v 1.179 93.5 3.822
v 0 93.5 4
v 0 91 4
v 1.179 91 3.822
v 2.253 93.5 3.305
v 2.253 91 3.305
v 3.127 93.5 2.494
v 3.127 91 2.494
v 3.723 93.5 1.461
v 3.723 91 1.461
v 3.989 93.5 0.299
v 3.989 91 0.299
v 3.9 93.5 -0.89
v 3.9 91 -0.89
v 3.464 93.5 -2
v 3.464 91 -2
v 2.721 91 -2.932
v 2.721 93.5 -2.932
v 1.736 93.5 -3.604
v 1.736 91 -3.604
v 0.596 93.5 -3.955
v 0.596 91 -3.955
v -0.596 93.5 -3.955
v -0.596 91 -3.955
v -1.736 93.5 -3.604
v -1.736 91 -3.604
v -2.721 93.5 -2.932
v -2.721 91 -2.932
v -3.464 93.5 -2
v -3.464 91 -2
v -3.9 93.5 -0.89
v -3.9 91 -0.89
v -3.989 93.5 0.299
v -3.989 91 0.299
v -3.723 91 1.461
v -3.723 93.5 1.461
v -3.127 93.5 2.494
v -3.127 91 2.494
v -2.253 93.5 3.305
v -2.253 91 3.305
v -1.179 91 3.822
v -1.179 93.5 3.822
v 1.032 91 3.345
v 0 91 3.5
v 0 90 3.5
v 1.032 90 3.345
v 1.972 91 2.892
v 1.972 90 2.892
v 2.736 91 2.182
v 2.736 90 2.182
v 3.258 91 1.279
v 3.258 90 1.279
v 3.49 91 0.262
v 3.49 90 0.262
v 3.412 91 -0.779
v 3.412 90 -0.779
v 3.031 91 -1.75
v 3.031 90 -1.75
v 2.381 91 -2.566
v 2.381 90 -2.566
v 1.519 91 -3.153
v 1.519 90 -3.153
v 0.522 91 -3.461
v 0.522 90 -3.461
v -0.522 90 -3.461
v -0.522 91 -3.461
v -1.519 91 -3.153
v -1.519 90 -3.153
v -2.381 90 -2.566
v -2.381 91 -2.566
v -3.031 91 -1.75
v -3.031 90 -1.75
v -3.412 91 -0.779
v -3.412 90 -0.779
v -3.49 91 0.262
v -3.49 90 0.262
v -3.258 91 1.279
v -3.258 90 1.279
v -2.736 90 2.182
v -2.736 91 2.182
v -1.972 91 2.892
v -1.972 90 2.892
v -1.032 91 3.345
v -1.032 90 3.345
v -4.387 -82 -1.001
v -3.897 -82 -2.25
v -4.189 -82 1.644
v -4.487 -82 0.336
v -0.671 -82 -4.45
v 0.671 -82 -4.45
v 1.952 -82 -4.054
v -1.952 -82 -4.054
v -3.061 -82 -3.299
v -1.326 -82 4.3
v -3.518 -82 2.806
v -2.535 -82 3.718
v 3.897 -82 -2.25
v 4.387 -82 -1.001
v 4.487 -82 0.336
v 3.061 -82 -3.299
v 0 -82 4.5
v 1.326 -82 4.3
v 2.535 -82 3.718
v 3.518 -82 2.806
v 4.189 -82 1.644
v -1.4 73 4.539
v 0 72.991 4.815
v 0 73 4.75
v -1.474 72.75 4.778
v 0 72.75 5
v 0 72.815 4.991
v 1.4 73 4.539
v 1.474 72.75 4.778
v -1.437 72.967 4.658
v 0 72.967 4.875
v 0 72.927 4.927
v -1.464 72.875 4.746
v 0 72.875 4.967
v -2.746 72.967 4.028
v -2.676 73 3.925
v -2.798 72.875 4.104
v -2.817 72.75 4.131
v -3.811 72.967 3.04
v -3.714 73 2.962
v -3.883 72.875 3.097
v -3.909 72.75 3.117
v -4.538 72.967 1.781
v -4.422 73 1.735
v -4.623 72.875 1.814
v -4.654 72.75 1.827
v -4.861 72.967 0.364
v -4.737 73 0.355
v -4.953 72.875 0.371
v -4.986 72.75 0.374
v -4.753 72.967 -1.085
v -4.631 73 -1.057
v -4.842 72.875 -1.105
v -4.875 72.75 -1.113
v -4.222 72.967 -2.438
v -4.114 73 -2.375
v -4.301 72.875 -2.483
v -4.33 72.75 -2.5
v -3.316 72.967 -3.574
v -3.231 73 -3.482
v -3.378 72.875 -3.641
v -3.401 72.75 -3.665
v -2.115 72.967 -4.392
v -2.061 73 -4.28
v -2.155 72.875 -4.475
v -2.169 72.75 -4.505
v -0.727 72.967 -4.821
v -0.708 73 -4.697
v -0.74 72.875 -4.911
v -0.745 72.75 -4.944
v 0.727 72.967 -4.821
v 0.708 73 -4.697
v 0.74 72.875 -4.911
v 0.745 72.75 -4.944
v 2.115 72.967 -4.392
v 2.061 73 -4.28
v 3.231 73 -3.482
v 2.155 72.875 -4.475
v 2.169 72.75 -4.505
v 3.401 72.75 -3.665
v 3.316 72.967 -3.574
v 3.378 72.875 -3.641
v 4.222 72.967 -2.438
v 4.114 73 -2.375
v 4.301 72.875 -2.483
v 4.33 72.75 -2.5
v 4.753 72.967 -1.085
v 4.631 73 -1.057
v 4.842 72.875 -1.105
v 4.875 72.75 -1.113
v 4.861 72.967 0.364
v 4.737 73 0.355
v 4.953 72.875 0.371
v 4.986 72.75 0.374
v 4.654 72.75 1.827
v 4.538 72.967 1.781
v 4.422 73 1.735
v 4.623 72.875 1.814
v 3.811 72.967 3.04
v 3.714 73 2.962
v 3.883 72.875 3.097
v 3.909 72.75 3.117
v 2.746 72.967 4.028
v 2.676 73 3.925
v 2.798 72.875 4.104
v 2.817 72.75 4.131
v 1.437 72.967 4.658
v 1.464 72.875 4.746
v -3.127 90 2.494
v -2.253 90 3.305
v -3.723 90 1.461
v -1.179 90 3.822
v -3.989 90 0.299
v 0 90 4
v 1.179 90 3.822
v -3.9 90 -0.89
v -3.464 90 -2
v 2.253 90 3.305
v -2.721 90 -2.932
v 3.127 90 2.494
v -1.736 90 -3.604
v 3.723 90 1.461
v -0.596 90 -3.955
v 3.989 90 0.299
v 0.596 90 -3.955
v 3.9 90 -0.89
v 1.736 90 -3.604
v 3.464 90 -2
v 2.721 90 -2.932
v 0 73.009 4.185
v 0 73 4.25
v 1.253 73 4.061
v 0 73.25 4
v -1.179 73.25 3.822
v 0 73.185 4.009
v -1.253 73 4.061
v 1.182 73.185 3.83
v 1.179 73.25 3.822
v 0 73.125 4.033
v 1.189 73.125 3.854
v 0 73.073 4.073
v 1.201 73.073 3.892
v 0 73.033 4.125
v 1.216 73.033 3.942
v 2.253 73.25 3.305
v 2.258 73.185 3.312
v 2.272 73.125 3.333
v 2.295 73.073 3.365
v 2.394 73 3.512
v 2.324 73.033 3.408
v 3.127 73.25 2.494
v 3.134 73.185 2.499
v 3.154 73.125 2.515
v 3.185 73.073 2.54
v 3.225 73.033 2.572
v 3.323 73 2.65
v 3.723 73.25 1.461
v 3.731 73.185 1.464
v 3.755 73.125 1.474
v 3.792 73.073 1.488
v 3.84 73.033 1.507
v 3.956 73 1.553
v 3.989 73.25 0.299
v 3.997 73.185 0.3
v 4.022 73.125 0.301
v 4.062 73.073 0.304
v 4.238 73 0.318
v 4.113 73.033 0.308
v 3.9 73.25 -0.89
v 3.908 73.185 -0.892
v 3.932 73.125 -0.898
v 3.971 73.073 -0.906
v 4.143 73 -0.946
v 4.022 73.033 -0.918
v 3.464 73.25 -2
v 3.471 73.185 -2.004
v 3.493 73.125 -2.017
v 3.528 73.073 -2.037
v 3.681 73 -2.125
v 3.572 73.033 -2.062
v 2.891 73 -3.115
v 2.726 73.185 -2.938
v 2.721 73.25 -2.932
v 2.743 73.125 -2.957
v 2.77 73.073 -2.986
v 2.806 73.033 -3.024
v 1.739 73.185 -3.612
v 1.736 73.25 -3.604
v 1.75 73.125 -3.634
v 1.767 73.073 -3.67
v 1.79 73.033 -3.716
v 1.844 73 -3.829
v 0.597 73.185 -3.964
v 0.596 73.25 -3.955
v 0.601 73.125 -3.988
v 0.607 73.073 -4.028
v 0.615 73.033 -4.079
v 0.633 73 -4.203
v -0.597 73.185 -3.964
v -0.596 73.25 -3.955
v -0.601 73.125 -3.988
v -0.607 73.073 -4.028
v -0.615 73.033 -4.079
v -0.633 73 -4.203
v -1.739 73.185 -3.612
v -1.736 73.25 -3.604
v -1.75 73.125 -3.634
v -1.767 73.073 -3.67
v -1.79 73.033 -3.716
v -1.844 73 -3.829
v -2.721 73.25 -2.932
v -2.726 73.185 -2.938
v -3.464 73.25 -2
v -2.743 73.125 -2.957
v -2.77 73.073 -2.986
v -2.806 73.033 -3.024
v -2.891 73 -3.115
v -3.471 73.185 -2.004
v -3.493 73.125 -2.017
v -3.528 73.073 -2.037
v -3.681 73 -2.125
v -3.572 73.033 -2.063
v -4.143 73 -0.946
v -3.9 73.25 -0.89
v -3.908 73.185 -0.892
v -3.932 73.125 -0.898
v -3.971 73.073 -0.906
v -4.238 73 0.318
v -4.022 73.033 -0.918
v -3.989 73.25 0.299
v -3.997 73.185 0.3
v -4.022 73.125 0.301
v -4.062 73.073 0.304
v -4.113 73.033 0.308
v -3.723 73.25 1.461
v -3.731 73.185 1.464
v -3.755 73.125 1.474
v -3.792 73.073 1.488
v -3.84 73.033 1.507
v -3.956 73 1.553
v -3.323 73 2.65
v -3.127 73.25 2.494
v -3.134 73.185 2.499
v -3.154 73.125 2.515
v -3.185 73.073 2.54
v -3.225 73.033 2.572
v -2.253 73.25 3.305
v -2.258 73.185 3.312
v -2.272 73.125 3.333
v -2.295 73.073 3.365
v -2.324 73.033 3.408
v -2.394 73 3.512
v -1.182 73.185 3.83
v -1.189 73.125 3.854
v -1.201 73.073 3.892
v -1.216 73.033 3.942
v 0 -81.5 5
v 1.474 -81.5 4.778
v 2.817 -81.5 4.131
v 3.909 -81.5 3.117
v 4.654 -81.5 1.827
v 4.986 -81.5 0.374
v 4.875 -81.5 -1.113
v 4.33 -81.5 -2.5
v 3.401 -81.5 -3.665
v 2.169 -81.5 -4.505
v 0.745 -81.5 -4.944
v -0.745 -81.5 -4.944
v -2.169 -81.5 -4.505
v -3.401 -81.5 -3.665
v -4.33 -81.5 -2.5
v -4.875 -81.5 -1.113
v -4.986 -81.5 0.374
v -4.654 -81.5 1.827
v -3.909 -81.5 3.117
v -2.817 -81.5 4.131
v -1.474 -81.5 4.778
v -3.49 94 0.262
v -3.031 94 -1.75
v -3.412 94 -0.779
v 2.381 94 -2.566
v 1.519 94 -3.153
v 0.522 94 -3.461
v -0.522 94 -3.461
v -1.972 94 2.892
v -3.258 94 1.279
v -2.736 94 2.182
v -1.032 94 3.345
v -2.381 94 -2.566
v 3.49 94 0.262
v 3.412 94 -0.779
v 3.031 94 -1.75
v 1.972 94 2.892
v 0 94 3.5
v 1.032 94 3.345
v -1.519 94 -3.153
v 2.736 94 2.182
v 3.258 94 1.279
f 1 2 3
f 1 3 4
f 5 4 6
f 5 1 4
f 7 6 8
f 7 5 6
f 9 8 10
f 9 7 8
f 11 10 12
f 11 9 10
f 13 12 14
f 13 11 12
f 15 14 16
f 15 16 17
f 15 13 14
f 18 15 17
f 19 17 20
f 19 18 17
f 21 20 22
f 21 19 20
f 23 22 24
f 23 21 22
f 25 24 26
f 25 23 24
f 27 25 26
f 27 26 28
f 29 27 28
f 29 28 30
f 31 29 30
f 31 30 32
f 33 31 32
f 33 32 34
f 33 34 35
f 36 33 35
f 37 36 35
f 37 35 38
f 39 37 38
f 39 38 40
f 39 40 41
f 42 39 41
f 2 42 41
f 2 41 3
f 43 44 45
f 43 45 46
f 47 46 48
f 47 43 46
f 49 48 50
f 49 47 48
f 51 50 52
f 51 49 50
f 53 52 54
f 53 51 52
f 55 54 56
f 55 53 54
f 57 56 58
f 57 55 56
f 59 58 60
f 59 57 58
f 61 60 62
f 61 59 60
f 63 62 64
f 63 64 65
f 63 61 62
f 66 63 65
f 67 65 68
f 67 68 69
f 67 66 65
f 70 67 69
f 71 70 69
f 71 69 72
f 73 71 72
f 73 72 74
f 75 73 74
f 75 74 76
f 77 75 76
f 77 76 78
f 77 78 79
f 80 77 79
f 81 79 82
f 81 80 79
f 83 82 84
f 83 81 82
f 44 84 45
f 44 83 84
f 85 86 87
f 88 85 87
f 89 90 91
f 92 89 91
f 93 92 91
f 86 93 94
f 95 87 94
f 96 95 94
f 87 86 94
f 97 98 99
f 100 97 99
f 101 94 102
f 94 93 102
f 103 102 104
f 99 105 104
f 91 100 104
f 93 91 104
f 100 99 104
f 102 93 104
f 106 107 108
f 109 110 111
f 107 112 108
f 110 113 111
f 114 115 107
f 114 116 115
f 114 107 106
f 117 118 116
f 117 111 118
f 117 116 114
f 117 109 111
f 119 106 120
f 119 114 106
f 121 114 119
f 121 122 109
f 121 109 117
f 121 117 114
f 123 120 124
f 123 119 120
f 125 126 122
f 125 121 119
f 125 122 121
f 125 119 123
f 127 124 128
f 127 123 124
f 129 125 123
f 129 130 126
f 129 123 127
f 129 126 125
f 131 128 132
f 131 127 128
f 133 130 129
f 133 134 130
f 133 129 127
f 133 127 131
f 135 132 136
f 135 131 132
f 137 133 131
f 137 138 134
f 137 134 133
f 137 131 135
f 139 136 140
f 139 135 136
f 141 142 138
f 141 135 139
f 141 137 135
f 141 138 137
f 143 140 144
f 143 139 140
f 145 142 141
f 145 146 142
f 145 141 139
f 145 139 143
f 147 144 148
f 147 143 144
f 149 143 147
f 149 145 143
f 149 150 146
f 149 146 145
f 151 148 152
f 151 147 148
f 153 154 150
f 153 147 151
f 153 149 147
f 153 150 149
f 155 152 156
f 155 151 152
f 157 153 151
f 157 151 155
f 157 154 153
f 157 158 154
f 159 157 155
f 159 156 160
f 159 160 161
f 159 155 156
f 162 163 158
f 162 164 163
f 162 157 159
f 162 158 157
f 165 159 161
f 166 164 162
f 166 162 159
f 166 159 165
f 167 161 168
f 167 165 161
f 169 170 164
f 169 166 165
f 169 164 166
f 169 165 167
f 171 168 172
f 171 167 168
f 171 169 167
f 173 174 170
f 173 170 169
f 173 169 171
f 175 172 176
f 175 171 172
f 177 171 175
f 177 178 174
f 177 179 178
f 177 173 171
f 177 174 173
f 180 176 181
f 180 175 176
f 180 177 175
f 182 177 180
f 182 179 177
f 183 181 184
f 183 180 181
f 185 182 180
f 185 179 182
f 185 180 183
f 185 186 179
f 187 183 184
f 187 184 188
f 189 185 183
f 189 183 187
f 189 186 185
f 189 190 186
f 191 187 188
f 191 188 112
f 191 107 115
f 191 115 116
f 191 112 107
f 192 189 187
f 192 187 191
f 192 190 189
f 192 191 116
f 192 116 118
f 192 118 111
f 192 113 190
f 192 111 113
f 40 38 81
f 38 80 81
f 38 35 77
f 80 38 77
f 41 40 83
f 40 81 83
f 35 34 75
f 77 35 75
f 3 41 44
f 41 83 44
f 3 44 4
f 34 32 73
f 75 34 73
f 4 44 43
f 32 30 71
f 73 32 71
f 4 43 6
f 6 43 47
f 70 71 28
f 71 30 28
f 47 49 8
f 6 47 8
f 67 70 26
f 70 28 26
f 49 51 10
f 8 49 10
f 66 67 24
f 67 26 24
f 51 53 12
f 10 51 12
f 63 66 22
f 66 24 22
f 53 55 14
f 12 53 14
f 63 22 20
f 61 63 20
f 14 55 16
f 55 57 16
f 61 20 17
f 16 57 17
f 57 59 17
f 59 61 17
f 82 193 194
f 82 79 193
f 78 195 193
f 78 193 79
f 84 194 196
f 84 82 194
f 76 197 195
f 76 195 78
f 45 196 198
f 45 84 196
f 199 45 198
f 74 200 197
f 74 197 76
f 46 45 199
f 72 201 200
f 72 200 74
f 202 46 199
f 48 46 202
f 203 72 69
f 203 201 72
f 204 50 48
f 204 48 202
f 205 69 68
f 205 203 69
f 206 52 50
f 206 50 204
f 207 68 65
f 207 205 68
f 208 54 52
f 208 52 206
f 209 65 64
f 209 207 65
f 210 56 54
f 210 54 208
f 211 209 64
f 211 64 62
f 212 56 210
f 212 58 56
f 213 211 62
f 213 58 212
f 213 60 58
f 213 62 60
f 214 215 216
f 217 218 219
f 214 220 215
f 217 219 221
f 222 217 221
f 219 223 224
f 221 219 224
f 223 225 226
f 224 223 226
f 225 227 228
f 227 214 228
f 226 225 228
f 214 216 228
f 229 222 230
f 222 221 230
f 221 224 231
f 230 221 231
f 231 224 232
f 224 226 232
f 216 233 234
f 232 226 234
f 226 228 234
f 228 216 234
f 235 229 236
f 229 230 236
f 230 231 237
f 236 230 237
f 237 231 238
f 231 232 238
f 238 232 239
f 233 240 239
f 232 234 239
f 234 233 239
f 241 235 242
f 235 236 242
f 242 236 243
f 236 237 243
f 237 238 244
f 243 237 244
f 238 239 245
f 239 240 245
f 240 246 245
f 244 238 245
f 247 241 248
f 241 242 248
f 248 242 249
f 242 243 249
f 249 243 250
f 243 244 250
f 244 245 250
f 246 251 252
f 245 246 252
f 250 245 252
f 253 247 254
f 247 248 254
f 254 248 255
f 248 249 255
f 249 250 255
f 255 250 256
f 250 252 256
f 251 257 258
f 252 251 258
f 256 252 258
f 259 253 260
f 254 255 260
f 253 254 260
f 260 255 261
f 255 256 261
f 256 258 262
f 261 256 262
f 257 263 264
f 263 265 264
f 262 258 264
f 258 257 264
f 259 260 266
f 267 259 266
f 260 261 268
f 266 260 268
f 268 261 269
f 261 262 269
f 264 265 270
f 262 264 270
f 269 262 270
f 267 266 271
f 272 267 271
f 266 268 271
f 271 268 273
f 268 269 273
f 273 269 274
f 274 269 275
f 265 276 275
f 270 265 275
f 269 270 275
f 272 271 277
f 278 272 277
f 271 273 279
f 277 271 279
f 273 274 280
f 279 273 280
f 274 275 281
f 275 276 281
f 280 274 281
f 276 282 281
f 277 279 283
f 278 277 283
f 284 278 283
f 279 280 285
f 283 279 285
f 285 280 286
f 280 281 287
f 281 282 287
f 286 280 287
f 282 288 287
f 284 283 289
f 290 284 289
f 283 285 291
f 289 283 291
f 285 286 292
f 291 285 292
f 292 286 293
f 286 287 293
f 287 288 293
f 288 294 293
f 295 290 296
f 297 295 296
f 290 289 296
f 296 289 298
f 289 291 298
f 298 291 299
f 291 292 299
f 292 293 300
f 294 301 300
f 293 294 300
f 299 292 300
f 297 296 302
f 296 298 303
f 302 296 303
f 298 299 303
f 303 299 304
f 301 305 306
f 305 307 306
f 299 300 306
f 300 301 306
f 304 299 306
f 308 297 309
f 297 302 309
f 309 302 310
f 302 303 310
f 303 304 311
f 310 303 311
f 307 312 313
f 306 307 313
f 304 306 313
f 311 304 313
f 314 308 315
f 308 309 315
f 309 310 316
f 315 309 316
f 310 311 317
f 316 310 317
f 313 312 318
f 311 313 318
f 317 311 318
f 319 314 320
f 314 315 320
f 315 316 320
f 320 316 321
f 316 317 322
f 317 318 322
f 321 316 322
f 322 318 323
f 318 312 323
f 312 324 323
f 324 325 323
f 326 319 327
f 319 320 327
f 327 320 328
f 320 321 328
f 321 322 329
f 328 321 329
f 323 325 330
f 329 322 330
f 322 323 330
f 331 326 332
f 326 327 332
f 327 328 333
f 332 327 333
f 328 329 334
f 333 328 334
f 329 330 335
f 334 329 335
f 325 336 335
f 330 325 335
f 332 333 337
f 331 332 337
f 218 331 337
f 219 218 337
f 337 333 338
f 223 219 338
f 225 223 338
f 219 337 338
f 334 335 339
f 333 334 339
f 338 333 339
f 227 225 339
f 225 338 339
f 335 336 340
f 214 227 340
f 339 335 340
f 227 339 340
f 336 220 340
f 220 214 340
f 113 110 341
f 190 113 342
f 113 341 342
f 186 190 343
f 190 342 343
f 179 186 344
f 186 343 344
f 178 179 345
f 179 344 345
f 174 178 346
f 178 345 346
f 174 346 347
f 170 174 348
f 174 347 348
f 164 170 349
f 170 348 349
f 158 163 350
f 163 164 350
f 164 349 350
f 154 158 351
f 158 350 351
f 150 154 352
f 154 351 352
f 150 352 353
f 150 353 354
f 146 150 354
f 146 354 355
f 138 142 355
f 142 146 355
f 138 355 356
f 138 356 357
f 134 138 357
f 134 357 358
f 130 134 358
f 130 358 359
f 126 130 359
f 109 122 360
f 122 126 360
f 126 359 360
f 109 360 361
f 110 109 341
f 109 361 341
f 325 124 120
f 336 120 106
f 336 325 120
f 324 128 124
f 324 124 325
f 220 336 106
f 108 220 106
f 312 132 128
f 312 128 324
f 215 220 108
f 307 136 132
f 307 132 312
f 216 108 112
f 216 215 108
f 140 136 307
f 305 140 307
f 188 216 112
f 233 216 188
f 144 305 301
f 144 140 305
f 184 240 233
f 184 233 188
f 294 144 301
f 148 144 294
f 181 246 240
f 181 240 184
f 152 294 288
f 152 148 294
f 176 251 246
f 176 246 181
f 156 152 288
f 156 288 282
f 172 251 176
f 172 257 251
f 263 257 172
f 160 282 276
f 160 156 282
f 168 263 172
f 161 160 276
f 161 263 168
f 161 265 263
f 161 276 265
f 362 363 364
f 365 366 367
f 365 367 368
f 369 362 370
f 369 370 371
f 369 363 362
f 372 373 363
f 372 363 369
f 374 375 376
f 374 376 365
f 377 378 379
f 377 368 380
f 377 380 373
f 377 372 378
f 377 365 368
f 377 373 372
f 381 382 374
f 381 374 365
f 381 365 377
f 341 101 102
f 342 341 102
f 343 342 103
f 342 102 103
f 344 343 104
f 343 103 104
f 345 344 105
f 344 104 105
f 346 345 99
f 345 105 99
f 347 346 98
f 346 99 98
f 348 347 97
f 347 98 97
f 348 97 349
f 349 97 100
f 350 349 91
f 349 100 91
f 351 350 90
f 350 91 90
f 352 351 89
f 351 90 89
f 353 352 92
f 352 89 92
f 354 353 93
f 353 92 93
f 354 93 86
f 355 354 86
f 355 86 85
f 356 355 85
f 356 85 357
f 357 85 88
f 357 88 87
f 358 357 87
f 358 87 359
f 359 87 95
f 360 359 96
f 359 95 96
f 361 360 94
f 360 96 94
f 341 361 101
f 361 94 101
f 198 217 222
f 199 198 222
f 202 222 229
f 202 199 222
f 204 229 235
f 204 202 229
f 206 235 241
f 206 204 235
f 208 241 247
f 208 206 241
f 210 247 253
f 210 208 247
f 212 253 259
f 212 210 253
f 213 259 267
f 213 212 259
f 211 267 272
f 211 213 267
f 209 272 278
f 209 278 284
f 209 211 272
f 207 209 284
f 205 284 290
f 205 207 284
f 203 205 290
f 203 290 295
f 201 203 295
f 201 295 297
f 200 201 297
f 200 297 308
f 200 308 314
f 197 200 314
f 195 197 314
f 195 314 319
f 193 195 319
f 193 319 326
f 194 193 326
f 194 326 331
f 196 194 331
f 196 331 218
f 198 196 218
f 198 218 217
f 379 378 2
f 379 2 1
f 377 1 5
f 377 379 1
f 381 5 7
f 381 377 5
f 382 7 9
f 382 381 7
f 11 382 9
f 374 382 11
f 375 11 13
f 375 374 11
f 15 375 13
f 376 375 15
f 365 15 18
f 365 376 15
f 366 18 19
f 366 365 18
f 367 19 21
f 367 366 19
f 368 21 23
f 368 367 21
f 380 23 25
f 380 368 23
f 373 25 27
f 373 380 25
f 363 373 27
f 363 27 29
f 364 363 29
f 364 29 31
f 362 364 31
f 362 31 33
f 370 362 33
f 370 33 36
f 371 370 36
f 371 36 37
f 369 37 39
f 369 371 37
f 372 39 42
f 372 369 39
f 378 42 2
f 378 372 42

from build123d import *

# Parameters (mm, degrees)
RESSALTO_EXTRUS_O1_DEPTH      = 94
RESSALTO_EXTRUS_O1_DEPTH_BACK = 82
ESBO_O1_R                     = 5
ESBO_O2_R                     = 14
ESBO_O2_R_2                   = 4
CORTE_EXTRUS_O1_DEPTH         = 21
CHANFRO1_SIZE                 = 0.5
FILETE1_R                     = 0.25
CHANFRO2_SIZE                 = 0.5
CORTE_EXTRUS_O2_START         = -3
ESBO_O3_R                     = 13.5
ESBO_O3_R_2                   = 3.5
CORTE_EXTRUS_O2_DEPTH         = 1


with BuildPart() as part:
    # Esboço1 → Ressalto-extrusão1 (new, two sides: drawn at the far end of the back side and taken through both)
    with BuildSketch(Plane(origin=(0, 0, 0), x_dir=(1, 0, 0), z_dir=(0, 1, 0)).offset(-RESSALTO_EXTRUS_O1_DEPTH_BACK)):
        with Locations(Location((0, 0, 0), (0, 0, 270))):
            Circle(ESBO_O1_R)
    extrude(amount=RESSALTO_EXTRUS_O1_DEPTH + RESSALTO_EXTRUS_O1_DEPTH_BACK)

    # Esboço2 → Corte-extrusão1 (cut)
    with BuildSketch(Plane(origin=(0, 94, 0), x_dir=(1, 0, 0), z_dir=(0, 1, 0))):
        Circle(ESBO_O2_R)
        with Locations(Location((0, 0, 0), (0, 0, 270))):
            Circle(ESBO_O2_R_2, mode=Mode.SUBTRACT)
    extrude(amount=-CORTE_EXTRUS_O1_DEPTH, mode=Mode.SUBTRACT)

    # Chanfro1
    chanfro1_edges = [part.edges().sort_by_distance(p)[0] for p in [
        (0, 94, -4),
    ]]
    chamfer(chanfro1_edges, length=CHANFRO1_SIZE)

    # Filete1
    filete1_edges = [part.edges().sort_by_distance(p)[0] for p in [
        (0, 73, -5),
        (0, 73, -4),
    ]]
    fillet(filete1_edges, radius=FILETE1_R)

    # Chanfro2
    chanfro2_edges = [part.edges().sort_by_distance(p)[0] for p in [
        (0, -82, -5),
    ]]
    chamfer(chanfro2_edges, length=CHANFRO2_SIZE)

    # Esboço3 → Corte-extrusão2 (cut)
    with BuildSketch(Plane(origin=(0, 94, 0), x_dir=(1, 0, 0), z_dir=(0, 1, 0)).offset(CORTE_EXTRUS_O2_START)):
        Circle(ESBO_O3_R)
        with Locations(Location((0, 0, 0), (0, 0, 270))):
            Circle(ESBO_O3_R_2, mode=Mode.SUBTRACT)
    extrude(amount=-CORTE_EXTRUS_O2_DEPTH, mode=Mode.SUBTRACT)


solid = part.part
